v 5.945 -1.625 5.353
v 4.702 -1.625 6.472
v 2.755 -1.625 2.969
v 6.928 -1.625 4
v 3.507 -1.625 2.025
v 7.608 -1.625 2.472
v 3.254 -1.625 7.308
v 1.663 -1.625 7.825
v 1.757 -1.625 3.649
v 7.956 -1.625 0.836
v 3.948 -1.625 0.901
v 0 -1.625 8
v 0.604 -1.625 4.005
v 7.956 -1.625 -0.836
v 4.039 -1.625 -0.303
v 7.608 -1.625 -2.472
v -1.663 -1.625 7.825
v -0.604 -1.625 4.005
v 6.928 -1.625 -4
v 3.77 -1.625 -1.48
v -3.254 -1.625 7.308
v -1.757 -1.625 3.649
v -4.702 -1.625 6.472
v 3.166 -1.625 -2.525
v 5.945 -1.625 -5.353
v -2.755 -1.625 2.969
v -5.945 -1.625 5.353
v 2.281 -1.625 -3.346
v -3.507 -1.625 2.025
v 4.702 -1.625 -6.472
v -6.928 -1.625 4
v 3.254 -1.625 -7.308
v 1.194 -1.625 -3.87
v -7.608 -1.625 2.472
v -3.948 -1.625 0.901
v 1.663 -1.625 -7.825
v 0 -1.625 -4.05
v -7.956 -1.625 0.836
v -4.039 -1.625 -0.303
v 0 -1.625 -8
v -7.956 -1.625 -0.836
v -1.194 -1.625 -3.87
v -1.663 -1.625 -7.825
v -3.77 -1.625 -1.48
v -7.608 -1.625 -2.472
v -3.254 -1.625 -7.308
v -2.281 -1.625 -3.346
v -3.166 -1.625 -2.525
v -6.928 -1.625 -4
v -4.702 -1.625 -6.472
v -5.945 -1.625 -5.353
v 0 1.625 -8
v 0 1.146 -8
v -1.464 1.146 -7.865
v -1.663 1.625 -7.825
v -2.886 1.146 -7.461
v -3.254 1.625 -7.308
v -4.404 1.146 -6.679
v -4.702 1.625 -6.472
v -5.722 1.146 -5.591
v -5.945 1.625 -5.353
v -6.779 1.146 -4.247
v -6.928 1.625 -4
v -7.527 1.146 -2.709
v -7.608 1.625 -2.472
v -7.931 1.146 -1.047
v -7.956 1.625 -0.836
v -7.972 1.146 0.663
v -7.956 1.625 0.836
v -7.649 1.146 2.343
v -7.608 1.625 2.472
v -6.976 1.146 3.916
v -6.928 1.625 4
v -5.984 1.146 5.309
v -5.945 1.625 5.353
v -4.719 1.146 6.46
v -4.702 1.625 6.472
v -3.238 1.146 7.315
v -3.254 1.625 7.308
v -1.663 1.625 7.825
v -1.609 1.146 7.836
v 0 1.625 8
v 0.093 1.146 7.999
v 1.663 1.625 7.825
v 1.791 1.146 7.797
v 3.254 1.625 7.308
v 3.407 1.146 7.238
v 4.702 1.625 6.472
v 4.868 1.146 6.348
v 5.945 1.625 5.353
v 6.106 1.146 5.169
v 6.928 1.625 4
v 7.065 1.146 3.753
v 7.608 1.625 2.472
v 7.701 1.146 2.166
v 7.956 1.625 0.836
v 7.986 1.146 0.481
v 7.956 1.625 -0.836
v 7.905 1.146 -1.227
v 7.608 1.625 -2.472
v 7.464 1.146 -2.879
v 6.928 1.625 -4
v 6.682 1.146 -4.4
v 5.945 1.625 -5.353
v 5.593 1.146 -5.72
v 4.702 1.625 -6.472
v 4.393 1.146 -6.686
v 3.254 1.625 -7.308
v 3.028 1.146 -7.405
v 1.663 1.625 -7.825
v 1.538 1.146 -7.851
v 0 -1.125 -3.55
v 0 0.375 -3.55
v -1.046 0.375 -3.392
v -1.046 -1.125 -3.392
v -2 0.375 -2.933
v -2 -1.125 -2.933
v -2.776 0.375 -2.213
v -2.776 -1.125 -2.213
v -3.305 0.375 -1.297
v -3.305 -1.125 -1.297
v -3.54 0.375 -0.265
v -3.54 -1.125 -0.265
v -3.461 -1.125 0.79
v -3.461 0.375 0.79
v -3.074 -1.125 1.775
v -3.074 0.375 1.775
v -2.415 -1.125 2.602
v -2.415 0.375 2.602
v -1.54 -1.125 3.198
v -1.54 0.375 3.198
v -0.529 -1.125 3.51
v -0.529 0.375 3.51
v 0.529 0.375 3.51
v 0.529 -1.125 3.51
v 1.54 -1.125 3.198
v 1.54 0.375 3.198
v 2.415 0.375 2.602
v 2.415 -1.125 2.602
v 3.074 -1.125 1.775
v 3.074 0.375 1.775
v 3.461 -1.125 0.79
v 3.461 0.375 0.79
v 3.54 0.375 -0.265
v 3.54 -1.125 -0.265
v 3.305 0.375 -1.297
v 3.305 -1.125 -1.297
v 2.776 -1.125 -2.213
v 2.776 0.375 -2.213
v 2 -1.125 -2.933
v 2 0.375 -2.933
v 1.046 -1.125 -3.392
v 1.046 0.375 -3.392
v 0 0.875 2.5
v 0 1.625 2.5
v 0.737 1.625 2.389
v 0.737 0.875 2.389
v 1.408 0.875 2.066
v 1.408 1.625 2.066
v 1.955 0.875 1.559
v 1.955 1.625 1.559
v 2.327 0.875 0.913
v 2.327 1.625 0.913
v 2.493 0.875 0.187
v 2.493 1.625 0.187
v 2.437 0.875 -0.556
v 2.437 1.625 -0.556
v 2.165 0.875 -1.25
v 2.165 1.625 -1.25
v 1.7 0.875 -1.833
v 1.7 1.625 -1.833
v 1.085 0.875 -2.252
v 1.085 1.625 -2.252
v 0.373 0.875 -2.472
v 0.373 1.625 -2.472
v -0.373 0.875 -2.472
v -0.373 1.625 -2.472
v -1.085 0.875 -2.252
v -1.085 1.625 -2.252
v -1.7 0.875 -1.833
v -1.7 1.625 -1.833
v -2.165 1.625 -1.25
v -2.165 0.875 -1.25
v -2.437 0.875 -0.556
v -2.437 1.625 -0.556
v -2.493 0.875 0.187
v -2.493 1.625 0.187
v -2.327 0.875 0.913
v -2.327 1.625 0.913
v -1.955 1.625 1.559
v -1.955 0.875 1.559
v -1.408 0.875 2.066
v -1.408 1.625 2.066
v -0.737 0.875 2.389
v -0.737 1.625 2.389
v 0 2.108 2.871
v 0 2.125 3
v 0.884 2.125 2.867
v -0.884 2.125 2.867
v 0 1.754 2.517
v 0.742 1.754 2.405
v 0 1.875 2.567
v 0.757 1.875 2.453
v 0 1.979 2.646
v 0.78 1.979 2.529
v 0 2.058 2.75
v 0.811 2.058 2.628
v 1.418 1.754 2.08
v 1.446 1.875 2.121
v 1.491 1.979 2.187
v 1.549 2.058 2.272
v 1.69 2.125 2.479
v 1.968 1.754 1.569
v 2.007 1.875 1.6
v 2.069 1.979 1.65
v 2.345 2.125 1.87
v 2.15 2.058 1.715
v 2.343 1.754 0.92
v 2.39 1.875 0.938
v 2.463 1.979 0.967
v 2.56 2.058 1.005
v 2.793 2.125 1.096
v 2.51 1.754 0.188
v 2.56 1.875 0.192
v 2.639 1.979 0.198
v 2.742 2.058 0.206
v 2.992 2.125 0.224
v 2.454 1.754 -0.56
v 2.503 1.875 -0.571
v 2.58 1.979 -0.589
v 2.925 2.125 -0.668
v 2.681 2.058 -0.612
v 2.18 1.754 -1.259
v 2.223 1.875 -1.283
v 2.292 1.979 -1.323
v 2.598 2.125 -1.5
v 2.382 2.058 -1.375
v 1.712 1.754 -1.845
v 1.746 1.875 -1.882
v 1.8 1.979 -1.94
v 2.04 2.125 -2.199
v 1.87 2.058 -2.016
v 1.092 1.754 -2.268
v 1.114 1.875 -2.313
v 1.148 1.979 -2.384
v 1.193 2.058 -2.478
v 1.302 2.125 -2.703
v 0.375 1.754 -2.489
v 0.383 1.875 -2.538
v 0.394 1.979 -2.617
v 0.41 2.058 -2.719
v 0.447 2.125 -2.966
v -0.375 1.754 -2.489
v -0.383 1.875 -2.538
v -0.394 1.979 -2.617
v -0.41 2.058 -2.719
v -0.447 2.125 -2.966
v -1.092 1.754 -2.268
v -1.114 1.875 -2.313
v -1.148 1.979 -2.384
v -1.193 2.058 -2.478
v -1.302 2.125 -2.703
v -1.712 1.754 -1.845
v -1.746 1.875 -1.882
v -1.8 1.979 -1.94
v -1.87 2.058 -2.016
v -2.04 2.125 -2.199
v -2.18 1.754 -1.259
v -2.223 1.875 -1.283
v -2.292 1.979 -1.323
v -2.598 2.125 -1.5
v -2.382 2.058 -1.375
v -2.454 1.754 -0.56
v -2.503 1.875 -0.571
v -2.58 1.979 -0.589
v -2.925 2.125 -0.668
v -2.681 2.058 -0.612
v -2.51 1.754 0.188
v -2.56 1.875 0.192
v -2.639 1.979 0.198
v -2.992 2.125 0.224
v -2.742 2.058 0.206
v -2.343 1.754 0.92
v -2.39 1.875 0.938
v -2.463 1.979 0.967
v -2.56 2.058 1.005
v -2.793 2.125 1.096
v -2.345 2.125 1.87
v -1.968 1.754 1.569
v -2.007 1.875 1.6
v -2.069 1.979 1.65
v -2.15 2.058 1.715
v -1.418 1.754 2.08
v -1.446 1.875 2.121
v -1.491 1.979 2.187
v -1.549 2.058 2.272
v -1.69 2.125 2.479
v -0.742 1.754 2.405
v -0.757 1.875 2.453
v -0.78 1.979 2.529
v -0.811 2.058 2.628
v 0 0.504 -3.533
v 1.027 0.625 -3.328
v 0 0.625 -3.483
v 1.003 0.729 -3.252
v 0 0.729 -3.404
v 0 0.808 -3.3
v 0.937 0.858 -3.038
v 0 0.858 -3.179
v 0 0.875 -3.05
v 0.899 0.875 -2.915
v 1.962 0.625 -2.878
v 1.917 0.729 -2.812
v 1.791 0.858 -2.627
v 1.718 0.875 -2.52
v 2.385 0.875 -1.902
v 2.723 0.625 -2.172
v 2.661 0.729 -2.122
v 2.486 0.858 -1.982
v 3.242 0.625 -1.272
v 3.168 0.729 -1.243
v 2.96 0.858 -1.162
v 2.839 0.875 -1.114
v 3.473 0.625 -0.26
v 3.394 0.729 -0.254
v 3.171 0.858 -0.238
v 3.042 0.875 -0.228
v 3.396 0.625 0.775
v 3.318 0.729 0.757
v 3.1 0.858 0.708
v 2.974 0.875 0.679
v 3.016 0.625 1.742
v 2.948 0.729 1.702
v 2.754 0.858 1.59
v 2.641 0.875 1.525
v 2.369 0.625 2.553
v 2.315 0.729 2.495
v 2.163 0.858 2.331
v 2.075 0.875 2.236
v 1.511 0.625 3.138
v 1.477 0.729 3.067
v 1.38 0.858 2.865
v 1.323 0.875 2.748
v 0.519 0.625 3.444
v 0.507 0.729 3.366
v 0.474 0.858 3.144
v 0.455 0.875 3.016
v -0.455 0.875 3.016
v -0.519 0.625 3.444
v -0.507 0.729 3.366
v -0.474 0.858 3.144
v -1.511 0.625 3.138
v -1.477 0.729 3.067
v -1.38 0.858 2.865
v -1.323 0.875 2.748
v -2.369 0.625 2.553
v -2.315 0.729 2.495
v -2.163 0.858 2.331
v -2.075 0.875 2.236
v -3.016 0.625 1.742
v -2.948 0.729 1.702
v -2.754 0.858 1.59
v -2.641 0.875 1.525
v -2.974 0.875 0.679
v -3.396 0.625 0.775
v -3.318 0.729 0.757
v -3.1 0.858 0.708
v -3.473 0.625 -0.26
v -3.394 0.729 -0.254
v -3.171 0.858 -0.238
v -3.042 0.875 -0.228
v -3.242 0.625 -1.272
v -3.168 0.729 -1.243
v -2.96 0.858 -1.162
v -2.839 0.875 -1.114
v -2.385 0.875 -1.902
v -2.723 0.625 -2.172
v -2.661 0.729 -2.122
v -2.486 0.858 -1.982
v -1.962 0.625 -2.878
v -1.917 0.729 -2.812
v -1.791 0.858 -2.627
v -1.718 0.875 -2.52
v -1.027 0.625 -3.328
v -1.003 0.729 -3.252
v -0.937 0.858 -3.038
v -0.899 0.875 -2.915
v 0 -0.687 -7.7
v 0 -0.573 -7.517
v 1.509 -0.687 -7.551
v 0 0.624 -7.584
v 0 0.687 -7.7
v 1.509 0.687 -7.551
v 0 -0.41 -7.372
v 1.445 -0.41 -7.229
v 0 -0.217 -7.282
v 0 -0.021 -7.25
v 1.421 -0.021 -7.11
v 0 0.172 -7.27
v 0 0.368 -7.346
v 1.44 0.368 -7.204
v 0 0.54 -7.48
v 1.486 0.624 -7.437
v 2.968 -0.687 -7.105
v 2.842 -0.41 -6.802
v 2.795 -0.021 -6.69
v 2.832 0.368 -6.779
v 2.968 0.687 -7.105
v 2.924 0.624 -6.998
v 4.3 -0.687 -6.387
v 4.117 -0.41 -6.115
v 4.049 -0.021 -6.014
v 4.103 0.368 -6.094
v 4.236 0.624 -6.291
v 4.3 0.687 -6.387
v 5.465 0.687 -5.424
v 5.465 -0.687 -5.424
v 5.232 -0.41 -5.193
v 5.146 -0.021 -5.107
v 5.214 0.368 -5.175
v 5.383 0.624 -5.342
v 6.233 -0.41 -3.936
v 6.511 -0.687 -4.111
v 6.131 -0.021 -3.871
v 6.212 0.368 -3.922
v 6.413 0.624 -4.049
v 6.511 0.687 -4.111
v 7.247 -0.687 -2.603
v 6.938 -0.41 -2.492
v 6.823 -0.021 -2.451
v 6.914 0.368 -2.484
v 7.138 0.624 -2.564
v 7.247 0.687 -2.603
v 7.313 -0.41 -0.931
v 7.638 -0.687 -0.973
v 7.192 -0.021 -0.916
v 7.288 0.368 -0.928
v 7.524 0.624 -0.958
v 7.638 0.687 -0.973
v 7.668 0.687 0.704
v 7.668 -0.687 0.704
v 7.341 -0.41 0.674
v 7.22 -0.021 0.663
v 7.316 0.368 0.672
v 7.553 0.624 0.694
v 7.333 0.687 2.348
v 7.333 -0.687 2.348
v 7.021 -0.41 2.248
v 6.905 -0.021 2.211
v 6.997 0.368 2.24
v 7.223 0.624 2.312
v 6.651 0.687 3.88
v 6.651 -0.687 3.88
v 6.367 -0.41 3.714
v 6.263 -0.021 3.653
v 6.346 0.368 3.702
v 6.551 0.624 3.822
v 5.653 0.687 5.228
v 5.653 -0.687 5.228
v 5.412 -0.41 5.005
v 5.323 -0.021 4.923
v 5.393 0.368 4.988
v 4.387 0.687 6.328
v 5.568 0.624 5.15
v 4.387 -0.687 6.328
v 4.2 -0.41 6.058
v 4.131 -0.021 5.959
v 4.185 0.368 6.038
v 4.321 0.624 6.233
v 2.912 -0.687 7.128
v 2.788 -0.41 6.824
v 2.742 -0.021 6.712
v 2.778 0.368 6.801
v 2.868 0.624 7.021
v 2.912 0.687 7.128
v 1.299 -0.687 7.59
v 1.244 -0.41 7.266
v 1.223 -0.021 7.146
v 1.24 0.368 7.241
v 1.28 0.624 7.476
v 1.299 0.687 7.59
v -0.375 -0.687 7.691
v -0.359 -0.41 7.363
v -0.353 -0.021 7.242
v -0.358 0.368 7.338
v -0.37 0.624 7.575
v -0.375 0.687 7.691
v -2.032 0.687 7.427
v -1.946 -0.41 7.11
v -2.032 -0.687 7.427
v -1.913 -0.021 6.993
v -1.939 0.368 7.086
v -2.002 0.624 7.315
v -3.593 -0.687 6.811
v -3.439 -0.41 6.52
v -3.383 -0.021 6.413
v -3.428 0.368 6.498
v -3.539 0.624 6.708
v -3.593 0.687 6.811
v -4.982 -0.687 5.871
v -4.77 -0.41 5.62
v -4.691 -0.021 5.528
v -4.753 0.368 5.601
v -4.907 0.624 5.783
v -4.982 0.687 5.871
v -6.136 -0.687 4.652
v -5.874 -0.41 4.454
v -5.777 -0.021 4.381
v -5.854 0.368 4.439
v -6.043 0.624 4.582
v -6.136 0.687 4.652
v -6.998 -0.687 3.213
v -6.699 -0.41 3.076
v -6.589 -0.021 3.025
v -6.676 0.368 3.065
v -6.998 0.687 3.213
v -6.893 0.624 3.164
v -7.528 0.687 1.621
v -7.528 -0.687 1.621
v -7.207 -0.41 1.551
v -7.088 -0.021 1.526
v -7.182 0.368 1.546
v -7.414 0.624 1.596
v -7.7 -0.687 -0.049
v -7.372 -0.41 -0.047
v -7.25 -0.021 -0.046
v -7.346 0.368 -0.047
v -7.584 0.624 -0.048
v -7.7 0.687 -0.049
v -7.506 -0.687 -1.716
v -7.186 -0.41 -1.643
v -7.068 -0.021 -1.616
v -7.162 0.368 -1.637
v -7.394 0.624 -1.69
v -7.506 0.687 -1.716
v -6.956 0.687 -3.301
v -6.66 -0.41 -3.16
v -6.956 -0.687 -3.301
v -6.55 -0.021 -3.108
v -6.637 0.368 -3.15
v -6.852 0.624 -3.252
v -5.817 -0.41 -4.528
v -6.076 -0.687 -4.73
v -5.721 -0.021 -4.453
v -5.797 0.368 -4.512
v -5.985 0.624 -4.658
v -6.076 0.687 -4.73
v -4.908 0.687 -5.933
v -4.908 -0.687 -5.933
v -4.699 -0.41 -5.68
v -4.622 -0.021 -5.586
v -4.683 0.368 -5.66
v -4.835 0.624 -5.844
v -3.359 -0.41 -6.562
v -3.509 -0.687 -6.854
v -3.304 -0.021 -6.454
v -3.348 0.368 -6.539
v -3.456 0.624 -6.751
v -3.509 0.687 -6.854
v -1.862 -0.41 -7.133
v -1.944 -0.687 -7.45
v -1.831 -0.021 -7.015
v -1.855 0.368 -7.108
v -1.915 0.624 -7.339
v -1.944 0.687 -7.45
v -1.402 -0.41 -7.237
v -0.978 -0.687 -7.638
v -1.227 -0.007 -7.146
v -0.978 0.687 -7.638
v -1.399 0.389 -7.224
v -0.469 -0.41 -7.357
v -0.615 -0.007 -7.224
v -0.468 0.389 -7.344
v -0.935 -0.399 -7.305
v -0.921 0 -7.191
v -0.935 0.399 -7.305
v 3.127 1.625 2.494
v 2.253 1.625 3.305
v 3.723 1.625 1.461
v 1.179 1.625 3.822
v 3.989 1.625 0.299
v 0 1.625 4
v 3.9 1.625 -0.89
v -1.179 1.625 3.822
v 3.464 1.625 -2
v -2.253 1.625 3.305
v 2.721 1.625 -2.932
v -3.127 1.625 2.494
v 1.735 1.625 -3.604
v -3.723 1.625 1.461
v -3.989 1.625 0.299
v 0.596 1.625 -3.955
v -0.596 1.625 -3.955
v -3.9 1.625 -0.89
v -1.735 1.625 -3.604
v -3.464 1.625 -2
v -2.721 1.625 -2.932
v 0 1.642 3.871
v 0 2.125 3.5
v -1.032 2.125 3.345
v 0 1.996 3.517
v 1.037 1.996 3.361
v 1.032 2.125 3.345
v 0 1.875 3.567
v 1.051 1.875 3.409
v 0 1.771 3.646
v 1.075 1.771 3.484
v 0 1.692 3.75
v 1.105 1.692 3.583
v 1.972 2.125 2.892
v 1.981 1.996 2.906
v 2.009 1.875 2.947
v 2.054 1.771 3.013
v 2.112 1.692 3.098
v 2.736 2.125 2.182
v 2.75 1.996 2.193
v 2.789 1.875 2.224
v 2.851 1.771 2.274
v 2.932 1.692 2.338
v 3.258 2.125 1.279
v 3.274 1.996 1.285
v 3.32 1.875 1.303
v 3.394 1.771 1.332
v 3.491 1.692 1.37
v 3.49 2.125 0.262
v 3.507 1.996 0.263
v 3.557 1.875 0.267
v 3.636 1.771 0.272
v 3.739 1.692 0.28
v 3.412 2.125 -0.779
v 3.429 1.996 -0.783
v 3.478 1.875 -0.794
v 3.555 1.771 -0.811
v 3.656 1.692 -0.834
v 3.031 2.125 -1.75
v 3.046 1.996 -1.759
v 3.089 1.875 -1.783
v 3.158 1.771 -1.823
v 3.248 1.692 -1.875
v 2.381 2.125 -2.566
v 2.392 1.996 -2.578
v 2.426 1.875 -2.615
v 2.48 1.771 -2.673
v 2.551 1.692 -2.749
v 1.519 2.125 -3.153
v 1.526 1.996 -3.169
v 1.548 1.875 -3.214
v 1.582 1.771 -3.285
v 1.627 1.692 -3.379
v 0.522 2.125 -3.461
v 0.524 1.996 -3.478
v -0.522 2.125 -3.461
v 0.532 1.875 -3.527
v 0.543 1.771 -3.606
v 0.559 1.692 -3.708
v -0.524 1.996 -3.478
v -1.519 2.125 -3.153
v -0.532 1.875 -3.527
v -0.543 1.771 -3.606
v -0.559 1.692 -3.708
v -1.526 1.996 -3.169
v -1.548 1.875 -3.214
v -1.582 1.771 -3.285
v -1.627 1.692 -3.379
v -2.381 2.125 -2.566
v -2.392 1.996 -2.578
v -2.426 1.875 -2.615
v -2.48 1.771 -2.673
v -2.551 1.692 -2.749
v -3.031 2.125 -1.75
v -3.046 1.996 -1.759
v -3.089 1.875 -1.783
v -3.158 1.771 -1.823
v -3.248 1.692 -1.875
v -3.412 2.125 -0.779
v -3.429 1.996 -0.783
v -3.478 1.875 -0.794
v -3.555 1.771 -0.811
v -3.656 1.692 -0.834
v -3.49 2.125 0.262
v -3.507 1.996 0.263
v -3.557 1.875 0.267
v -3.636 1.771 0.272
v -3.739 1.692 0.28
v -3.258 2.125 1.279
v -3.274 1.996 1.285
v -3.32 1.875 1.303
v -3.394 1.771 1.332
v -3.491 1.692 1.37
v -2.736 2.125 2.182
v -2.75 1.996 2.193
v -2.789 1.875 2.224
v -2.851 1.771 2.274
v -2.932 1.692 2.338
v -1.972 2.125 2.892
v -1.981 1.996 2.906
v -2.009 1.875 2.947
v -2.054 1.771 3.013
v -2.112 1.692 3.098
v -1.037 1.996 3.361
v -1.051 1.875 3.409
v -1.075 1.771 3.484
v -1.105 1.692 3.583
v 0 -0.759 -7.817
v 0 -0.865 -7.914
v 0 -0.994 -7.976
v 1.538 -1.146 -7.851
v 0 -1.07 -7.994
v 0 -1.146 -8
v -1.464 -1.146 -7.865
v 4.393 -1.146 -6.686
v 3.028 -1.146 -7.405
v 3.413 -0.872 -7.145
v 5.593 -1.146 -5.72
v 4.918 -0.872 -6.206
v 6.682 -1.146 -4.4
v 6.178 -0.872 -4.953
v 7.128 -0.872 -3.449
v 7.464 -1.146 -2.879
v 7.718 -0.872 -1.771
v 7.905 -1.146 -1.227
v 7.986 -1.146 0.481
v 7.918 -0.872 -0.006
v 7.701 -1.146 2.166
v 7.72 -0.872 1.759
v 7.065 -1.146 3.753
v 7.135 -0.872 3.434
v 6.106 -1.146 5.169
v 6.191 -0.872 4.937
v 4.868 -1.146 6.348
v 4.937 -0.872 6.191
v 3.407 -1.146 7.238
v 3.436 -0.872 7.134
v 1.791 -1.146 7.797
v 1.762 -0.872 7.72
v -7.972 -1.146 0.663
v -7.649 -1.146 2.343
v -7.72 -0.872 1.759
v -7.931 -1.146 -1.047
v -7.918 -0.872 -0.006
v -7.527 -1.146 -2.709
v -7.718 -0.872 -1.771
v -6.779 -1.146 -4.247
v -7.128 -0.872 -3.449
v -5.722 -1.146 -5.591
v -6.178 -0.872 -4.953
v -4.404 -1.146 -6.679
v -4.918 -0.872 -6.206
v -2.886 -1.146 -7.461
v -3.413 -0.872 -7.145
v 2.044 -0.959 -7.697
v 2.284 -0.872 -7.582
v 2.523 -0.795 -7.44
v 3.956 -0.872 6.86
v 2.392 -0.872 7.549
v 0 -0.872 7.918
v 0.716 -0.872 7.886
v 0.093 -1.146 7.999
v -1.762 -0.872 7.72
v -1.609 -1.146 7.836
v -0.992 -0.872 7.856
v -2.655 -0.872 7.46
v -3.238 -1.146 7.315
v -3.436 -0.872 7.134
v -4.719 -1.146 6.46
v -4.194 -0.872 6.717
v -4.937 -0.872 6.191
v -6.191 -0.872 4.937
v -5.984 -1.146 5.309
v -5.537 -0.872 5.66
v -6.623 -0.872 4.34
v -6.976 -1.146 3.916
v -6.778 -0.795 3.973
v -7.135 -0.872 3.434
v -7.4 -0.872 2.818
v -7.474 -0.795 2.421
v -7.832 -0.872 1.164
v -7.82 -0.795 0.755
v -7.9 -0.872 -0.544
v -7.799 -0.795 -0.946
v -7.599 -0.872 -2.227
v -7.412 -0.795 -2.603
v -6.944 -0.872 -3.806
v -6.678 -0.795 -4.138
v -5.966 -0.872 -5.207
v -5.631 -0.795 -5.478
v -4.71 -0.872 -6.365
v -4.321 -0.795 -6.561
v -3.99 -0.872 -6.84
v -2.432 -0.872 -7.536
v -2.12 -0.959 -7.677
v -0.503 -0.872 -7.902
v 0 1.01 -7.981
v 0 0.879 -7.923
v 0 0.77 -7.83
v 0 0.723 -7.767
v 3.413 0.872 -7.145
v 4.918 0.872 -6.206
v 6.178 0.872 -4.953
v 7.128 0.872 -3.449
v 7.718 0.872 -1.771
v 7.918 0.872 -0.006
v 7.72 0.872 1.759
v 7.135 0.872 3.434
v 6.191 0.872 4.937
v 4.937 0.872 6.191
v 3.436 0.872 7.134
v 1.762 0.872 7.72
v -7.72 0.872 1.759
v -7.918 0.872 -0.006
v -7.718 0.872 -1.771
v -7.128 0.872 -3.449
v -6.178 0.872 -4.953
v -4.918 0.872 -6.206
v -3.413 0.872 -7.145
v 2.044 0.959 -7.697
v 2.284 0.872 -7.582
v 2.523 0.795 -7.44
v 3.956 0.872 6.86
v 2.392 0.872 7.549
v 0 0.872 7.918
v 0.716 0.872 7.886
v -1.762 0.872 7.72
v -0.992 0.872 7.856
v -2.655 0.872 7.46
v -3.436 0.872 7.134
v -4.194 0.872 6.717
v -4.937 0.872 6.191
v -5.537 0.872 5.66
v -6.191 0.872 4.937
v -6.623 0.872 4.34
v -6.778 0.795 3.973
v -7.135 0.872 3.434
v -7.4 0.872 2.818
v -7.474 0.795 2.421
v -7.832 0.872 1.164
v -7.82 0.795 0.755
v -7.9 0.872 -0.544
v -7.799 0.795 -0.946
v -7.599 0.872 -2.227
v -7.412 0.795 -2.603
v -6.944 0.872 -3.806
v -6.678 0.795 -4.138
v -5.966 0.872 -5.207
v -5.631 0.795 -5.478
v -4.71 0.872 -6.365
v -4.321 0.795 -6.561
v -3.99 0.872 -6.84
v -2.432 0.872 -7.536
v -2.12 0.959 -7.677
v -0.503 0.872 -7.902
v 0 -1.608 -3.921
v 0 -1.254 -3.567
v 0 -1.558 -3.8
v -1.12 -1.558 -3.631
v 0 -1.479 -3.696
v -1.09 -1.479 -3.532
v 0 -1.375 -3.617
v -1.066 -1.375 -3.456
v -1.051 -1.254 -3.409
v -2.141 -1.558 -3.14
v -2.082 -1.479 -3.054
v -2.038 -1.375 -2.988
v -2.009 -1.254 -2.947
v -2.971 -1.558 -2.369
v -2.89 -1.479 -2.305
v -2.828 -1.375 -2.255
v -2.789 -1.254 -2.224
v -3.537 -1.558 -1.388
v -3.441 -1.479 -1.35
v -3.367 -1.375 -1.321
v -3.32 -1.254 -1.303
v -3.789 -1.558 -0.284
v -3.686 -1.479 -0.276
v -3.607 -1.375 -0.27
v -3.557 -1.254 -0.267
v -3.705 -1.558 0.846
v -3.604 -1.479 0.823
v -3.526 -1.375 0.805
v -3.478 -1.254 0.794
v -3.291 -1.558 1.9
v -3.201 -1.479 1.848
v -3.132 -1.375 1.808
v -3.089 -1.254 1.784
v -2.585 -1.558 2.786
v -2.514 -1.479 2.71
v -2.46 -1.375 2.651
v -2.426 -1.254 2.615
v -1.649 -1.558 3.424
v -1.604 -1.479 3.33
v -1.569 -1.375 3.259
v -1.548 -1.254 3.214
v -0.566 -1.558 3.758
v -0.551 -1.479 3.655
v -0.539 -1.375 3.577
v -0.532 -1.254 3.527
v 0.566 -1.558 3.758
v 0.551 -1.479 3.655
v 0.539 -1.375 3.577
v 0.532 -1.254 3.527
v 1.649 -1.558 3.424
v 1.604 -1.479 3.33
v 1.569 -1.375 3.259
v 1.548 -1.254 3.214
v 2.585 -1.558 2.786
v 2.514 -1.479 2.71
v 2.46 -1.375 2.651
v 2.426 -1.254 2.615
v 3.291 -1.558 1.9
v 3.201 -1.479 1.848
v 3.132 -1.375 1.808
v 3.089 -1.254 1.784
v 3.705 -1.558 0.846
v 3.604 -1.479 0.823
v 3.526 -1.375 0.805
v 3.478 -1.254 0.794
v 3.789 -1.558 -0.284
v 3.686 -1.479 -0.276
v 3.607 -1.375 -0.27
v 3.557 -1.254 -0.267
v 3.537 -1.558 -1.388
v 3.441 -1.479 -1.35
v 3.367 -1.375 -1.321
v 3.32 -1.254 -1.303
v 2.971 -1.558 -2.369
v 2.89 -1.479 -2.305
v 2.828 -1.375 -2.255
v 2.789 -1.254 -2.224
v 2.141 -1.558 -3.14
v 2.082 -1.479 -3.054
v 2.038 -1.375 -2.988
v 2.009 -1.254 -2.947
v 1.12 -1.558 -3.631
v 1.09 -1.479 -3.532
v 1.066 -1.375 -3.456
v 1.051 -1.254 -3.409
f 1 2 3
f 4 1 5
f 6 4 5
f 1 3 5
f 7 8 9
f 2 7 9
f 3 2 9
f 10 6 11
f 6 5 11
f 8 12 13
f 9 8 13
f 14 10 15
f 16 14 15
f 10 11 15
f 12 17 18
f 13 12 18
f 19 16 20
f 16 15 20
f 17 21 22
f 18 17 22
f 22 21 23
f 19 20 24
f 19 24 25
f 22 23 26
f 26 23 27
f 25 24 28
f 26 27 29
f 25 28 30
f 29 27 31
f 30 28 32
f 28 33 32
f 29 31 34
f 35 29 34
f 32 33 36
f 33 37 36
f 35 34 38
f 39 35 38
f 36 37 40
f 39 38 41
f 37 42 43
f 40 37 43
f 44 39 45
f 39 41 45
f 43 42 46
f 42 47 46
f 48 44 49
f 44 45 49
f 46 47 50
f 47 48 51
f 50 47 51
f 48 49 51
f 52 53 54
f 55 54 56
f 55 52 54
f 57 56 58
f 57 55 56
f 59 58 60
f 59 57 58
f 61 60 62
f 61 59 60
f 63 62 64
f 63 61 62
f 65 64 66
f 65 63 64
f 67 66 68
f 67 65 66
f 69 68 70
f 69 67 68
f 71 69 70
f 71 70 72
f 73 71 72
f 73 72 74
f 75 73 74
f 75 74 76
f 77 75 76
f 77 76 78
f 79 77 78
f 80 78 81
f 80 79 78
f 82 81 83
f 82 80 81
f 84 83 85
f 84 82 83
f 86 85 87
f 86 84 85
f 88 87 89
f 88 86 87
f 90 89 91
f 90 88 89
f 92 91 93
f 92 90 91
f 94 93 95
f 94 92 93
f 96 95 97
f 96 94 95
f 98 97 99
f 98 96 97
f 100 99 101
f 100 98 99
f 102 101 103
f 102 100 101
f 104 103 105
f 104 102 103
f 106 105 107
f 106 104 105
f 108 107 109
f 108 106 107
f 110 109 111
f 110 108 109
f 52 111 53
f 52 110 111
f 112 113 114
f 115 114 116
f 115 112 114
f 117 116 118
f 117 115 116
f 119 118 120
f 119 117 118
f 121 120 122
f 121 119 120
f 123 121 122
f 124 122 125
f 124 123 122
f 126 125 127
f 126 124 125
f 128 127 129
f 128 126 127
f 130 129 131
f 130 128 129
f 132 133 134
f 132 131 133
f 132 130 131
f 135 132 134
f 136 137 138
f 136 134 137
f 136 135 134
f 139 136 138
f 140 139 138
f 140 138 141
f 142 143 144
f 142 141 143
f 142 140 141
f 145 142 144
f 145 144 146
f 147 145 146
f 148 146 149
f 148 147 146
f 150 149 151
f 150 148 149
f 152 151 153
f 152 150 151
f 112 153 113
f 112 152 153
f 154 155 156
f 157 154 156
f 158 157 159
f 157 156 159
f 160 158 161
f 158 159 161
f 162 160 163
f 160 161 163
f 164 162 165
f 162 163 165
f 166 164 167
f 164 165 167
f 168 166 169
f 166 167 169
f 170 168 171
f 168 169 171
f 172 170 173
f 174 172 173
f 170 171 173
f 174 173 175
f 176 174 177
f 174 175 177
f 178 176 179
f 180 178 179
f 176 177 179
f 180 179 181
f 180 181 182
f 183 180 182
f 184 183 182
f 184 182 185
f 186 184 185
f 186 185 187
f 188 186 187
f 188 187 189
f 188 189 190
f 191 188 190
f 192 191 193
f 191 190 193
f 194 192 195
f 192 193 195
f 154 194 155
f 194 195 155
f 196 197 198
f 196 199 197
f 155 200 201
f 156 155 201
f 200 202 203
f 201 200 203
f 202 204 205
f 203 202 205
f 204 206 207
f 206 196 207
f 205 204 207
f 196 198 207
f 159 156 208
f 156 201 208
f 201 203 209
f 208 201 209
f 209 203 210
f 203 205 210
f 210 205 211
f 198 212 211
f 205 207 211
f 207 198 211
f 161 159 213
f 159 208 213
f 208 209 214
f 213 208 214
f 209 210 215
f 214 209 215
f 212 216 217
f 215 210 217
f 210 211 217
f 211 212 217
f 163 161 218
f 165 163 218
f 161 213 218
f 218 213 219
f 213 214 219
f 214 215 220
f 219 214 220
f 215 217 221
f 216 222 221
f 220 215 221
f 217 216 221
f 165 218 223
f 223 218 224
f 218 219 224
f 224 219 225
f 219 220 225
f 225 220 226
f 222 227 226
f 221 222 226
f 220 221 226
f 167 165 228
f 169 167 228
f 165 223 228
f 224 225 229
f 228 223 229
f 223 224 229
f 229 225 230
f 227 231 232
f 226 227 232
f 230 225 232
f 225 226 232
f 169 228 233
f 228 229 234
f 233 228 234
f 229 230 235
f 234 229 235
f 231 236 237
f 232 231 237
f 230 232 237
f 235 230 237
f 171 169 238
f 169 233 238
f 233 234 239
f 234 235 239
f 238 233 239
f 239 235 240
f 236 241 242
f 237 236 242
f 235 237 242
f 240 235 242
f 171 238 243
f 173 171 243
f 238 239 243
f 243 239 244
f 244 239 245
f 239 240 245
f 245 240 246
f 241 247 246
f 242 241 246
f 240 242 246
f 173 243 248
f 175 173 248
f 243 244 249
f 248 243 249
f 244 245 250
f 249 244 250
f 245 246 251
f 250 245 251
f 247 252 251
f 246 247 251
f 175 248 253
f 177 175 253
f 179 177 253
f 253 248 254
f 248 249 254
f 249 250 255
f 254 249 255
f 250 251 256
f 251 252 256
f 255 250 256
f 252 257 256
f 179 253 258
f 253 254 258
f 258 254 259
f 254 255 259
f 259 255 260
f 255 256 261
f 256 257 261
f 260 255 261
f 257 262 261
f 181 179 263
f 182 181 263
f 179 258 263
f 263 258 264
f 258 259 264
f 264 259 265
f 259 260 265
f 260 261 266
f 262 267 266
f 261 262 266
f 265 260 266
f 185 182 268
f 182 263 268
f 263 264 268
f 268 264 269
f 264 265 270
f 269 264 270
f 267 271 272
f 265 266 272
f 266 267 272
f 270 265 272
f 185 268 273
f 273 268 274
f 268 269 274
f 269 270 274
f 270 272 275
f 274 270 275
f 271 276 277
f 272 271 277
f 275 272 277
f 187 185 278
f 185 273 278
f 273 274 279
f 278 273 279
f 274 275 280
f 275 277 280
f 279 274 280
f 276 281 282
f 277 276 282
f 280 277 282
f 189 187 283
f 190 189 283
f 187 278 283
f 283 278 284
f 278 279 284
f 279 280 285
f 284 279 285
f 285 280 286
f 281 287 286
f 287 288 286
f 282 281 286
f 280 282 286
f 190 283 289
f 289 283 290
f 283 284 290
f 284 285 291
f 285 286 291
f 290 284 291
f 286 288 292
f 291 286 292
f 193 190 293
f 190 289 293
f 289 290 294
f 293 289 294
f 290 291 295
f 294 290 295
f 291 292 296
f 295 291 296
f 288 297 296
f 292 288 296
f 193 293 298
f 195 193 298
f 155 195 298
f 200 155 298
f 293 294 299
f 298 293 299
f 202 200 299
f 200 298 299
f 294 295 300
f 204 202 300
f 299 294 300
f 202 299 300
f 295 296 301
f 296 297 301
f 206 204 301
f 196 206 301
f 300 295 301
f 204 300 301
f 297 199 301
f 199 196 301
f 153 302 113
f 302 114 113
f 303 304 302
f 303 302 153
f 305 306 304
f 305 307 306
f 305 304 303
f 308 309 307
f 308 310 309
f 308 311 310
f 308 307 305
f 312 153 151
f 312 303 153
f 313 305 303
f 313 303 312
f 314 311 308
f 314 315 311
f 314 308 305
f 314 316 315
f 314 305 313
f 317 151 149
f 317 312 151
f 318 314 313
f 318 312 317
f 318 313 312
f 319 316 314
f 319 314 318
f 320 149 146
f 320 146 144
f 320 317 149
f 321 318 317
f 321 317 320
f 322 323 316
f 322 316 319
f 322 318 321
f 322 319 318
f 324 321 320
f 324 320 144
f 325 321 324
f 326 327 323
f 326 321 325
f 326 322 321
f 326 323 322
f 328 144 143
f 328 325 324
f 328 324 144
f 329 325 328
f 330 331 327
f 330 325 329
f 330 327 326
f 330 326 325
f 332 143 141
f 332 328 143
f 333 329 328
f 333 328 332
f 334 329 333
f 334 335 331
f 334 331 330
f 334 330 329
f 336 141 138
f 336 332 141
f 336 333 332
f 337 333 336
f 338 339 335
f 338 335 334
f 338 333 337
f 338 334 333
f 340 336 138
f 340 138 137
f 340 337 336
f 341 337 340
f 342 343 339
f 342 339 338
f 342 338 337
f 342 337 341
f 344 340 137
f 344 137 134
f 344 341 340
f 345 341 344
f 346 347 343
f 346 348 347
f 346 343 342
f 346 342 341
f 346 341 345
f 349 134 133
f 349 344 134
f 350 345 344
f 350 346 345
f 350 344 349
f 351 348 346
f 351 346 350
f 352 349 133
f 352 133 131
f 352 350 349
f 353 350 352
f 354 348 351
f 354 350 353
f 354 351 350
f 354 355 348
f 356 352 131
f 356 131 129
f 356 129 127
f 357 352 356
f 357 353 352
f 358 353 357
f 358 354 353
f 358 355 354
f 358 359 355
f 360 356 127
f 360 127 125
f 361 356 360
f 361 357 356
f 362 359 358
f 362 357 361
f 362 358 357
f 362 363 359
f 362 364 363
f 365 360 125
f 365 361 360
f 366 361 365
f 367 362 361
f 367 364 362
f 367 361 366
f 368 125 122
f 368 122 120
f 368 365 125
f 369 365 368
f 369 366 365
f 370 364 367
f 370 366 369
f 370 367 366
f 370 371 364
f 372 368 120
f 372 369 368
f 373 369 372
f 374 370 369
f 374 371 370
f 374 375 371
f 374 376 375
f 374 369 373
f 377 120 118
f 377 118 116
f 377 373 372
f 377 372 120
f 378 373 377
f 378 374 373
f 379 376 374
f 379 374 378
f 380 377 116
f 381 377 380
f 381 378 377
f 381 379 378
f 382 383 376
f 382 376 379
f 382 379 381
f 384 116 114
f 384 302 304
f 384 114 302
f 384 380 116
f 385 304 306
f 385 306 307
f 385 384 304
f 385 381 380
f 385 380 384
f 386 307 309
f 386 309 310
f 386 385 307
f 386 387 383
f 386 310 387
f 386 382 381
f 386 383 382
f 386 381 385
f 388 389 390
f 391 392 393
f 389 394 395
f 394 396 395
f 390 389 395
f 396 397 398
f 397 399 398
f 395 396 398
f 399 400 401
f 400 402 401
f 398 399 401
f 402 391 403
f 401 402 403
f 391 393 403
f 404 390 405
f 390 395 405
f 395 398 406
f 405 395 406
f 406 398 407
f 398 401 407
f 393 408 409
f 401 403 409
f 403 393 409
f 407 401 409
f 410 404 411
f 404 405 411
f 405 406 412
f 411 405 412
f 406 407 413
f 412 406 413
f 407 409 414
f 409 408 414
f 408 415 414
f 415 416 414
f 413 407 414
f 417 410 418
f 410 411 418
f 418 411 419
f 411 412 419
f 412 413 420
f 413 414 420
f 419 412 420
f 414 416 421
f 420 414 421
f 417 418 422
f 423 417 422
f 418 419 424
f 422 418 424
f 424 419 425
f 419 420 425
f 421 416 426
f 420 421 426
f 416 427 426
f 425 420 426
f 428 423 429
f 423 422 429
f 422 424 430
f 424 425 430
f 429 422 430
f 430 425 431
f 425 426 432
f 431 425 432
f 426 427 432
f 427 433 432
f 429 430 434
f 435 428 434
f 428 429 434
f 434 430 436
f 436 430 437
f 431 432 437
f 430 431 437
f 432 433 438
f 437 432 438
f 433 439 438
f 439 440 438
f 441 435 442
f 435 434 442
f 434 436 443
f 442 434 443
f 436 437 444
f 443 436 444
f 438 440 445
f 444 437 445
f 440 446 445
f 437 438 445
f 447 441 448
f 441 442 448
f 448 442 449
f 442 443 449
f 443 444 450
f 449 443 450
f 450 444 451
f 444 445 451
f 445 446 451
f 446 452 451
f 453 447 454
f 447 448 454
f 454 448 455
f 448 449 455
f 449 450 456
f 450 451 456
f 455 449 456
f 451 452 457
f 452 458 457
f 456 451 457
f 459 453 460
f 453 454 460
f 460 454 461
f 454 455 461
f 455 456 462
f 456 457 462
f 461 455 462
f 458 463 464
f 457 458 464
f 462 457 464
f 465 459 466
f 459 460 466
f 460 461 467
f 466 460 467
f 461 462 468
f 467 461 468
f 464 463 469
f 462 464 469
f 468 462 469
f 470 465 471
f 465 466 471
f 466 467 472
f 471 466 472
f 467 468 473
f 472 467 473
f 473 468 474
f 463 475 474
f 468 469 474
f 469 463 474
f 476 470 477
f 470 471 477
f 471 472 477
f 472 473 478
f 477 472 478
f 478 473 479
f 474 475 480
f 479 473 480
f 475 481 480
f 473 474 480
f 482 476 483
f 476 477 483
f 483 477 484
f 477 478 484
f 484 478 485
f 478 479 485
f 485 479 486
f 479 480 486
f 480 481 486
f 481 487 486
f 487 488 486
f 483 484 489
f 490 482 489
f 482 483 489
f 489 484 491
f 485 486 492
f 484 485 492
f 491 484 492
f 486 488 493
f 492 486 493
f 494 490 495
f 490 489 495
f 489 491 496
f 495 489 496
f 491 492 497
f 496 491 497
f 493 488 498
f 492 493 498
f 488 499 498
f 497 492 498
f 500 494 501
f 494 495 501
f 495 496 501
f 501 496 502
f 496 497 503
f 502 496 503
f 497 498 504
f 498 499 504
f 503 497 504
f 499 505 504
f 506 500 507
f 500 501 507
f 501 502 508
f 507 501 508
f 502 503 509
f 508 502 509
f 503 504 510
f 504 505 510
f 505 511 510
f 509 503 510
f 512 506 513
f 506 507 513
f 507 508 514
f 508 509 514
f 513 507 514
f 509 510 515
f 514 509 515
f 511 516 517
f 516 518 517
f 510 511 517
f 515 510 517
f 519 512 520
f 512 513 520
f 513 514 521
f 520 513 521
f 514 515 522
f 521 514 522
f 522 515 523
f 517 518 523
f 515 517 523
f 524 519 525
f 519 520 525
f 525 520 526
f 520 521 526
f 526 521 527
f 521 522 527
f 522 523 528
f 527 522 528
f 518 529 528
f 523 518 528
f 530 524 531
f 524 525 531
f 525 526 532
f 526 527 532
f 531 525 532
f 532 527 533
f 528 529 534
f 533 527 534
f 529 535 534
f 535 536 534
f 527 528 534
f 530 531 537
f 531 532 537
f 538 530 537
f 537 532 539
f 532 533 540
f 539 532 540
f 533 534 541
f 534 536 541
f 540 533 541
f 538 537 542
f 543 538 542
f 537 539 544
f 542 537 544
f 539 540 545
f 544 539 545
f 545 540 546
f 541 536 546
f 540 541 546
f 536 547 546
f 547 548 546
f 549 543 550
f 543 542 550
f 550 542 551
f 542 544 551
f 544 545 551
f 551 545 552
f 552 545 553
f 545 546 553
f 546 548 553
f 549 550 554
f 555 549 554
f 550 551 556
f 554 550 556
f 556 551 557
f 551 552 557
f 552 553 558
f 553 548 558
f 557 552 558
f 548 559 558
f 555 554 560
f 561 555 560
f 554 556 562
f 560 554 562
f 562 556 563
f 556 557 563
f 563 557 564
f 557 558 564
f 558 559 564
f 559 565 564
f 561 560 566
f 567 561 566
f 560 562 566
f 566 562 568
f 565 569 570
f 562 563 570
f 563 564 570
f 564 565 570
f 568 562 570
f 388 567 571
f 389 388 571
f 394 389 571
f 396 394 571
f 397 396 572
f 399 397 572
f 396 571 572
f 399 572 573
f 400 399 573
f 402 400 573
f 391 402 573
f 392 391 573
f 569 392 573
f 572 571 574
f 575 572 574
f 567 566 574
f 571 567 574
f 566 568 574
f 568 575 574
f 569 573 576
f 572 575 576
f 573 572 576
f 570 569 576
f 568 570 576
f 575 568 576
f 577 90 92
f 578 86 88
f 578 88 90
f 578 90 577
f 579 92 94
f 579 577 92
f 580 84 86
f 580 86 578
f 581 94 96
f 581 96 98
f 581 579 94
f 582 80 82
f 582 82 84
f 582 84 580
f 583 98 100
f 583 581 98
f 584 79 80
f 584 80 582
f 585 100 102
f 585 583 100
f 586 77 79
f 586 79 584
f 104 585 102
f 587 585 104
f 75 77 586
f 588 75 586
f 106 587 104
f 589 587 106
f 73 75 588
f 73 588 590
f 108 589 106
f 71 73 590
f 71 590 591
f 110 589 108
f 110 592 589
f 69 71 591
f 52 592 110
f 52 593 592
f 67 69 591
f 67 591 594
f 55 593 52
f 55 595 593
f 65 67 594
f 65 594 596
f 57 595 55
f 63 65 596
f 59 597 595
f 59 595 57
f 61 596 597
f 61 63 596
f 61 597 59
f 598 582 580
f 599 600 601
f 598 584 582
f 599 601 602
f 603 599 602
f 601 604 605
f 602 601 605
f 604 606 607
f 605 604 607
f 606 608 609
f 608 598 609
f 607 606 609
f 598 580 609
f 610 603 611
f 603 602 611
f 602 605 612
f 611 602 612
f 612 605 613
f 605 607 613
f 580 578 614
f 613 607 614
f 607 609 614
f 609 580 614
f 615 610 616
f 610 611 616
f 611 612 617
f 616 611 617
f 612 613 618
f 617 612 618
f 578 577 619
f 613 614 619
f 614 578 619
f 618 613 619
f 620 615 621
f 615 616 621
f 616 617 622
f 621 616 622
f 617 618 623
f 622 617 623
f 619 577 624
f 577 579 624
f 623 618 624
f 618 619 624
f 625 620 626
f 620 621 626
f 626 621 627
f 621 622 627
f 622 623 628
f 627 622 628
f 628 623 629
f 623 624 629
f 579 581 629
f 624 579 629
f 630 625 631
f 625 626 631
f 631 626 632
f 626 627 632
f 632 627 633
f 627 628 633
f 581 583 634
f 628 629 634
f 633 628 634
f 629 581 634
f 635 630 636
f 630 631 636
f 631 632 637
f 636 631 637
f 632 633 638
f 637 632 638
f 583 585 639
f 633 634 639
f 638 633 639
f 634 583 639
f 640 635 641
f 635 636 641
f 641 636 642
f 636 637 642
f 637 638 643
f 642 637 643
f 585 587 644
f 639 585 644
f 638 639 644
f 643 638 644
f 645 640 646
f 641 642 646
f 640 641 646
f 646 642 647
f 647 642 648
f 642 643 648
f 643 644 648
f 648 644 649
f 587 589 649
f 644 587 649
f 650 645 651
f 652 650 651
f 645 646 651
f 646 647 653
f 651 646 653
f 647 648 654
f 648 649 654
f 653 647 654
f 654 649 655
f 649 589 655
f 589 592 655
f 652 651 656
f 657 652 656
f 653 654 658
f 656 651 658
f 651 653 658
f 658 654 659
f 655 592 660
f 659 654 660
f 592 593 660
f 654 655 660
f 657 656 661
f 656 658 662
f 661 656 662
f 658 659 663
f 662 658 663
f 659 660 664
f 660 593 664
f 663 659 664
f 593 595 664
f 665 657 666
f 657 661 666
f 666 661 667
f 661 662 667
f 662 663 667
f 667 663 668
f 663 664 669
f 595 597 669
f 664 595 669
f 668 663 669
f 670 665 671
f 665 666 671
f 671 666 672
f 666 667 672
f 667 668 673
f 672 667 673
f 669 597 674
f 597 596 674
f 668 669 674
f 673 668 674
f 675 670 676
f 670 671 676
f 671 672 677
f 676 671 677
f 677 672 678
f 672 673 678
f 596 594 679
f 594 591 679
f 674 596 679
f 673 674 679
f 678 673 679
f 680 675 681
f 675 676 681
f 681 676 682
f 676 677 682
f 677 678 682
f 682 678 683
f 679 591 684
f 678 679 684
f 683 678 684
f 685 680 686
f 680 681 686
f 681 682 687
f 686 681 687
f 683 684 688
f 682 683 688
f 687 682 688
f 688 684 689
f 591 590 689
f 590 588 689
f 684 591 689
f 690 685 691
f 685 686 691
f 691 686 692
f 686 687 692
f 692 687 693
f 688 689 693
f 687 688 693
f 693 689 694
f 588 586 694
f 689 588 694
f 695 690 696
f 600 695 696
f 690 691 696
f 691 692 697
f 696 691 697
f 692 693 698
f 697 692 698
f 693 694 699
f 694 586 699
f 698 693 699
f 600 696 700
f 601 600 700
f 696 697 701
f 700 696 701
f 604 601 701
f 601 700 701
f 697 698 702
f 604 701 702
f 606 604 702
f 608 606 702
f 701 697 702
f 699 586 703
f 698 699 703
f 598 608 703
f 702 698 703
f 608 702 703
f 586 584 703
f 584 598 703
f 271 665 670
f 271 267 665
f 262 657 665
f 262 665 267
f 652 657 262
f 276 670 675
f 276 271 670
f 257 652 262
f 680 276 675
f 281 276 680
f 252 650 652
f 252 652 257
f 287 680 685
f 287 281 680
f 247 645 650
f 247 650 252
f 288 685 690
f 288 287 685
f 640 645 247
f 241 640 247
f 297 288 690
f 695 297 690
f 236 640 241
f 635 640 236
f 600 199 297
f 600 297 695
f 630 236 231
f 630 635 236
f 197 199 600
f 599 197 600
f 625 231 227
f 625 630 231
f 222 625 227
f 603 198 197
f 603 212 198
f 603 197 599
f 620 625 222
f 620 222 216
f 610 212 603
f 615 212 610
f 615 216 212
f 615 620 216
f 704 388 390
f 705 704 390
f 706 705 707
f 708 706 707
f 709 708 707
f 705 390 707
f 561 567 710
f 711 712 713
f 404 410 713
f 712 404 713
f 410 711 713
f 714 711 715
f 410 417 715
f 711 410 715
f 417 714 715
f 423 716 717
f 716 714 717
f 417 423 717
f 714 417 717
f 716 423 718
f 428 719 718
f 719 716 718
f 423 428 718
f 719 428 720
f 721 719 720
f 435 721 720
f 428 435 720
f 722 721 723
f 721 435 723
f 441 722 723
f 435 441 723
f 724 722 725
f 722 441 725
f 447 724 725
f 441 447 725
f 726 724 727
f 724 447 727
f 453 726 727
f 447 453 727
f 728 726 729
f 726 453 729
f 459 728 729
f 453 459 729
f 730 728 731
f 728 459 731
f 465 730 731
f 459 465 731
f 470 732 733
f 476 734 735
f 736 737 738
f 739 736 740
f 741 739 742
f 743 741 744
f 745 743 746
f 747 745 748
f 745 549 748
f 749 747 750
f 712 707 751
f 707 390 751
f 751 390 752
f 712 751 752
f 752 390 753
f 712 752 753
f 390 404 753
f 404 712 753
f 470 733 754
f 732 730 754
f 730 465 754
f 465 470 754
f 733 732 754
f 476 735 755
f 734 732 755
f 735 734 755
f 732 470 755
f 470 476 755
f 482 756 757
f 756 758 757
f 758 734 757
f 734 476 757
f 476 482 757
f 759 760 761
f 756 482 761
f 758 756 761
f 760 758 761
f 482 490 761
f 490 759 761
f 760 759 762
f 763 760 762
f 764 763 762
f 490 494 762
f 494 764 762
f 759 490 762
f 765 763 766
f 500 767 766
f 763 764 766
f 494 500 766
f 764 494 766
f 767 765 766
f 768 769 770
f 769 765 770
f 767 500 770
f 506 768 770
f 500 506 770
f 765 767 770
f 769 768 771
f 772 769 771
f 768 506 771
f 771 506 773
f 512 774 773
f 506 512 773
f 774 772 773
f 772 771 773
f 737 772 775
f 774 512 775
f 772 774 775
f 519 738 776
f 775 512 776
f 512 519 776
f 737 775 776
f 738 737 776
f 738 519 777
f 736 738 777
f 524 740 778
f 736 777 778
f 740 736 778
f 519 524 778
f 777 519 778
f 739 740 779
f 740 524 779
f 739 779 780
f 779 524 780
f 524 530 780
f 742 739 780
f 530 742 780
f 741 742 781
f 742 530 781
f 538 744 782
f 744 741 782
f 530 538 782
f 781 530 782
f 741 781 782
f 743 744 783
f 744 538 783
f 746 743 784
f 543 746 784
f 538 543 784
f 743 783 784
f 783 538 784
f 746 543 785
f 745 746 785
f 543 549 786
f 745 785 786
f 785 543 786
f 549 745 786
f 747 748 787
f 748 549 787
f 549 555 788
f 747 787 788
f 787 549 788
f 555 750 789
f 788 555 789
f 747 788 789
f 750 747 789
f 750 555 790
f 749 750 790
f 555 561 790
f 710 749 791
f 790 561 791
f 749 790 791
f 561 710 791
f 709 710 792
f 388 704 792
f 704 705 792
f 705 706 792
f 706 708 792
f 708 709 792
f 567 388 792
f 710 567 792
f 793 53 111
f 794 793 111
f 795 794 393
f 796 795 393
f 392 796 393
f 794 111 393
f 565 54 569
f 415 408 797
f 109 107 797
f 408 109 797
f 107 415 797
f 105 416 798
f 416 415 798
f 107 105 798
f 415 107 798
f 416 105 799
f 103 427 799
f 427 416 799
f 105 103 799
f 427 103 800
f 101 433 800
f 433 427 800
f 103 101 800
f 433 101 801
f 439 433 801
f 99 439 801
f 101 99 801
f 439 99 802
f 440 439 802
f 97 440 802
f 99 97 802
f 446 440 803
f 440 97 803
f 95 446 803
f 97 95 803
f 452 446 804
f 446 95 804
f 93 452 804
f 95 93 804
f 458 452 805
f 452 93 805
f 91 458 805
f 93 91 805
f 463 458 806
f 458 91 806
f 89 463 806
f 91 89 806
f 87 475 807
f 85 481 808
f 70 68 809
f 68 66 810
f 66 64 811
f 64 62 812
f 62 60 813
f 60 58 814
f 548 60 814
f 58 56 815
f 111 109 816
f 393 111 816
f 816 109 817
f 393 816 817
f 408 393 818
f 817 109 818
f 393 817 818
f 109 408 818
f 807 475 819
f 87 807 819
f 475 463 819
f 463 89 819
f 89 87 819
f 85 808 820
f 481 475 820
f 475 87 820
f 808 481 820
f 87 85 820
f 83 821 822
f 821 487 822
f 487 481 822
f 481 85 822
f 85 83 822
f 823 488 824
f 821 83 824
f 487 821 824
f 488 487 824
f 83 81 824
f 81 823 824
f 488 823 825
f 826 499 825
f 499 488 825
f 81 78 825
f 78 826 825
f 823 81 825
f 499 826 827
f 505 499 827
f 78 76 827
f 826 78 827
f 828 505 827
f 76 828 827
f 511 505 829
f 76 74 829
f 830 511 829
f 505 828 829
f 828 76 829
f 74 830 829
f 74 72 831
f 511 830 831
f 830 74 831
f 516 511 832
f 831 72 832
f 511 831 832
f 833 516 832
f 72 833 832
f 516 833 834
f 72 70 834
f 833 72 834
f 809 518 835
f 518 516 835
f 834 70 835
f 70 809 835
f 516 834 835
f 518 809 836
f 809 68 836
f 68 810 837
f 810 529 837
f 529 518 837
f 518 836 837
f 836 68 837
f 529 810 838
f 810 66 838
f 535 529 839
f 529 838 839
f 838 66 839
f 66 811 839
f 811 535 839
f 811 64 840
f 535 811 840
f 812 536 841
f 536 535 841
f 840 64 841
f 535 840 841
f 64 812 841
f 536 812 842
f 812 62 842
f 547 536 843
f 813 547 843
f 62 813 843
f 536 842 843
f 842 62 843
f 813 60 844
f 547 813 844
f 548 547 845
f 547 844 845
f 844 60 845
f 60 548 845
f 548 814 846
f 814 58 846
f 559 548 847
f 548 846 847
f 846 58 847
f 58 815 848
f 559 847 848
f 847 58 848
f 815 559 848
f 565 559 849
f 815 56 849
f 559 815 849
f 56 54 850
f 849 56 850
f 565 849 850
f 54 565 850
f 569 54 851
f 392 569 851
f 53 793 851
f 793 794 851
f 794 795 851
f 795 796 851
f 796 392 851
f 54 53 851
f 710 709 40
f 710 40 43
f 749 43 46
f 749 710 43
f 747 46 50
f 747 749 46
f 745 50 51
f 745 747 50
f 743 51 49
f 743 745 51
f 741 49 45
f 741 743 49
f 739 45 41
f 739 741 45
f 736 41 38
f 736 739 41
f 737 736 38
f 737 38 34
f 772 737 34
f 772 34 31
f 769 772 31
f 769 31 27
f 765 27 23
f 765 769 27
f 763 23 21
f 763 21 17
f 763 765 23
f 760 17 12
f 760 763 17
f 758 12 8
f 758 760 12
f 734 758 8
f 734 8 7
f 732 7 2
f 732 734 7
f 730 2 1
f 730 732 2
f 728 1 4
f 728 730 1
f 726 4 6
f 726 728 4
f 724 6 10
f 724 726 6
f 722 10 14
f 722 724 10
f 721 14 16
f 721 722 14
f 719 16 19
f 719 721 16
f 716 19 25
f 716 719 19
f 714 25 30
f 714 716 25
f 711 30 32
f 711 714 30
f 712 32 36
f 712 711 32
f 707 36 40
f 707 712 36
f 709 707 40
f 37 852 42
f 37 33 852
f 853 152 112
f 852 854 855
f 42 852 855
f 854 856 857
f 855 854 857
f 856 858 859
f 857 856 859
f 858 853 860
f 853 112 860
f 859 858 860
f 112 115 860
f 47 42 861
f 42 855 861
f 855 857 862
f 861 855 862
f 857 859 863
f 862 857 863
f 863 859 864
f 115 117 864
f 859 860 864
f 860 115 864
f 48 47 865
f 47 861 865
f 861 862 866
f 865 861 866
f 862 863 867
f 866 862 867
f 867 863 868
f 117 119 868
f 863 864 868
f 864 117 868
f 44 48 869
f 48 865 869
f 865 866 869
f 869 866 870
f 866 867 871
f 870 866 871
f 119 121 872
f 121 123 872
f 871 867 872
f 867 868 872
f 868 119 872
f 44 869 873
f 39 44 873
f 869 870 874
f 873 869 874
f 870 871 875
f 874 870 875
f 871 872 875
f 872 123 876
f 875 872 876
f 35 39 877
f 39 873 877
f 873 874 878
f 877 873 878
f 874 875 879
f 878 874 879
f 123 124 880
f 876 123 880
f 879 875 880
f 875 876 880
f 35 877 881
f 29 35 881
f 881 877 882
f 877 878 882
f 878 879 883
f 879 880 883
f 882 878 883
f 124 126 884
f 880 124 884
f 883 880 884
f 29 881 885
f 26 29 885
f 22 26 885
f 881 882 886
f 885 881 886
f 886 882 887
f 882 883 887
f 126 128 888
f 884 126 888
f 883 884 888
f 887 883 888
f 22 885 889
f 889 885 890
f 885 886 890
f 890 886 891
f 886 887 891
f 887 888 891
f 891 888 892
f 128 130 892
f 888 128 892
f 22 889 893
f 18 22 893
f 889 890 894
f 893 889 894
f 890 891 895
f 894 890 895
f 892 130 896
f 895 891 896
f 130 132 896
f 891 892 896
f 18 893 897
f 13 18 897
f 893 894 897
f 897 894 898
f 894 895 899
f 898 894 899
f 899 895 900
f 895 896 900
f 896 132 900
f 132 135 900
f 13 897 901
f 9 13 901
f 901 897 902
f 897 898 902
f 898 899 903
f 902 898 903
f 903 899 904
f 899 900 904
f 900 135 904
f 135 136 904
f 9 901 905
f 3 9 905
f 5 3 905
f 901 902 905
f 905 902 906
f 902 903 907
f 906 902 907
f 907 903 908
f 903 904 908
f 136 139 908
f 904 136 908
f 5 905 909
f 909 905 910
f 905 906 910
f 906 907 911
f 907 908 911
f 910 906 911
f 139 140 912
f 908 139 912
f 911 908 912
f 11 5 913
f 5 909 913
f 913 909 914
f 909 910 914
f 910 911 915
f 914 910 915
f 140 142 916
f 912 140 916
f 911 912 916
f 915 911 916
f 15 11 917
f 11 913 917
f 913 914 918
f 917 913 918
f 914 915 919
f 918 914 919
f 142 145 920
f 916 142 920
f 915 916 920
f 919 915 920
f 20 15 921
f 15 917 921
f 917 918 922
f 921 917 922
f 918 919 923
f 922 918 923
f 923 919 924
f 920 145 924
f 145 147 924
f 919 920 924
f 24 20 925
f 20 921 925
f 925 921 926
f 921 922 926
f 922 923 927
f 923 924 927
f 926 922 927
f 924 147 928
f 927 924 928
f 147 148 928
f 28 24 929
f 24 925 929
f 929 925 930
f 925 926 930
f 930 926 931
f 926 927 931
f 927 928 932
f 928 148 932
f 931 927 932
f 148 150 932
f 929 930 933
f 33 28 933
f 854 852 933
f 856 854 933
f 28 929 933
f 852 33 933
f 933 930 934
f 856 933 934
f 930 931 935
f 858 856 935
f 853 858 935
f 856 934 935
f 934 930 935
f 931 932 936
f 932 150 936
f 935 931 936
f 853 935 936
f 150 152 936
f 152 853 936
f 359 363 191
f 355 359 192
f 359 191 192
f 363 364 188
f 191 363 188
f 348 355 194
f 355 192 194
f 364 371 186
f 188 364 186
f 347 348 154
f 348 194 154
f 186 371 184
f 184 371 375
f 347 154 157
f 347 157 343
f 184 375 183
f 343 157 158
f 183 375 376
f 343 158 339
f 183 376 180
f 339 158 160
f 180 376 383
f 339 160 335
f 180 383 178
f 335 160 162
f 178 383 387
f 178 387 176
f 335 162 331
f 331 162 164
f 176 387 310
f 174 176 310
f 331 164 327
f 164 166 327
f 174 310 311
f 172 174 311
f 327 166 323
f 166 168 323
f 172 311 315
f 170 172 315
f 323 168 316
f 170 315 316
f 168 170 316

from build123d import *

# Parameters (mm, degrees)
SKETCH1_R           = 8
SKETCH1_R_2         = 3.55
BOSS_EXTRUDE1_DEPTH = 1.625
SKETCH3_R           = 4
SKETCH3_R_2         = 2.5
BOSS_EXTRUDE2_DEPTH = 0.75
BOSS_EXTRUDE3_START = 0.5
SKETCH4_R           = 3.5
SKETCH4_R_2         = 2.5
BOSS_EXTRUDE3_DEPTH = 0.5
FILLET2_R           = 0.5


with BuildPart() as part:
    # Sketch1 → Boss-Extrude1 (new, symmetric)
    with BuildSketch(Plane(origin=(0, 0, 0), x_dir=(1, 0, 0), z_dir=(0, 1, 0))):
        with Locations(Location((0, 0, 0), (0, 0, 90))):
            Circle(SKETCH1_R)
        with Locations(Location((0, 0, 0), (0, 0, 90))):
            Circle(SKETCH1_R_2, mode=Mode.SUBTRACT)
    extrude(amount=BOSS_EXTRUDE1_DEPTH, both=True)

    # Sketch2 → Cut-Revolve1 (revolve, cut)
    with BuildSketch(Plane(origin=(0, 0, 0), x_dir=(0, 0, -1), z_dir=(1, 0, 0)), mode=Mode.PRIVATE) as cut_revolve1_sk:
        with BuildLine():
            Line((-8, 0.75), (-8, -0.75))
            add(Edge.make_bspline(
                [(-8, -0.75), (-7.25, -0.75), (-7.25, 0), (-7.25, 0.75), (-8, 0.75)],
                knots=[4.71238898, 4.71238898, 4.71238898, 6.283185307, 6.283185307, 7.853981634, 7.853981634, 7.853981634], degree=2, weights=[1, 0.707106781, 1, 0.707106781, 1]))
        make_face()
    revolve(cut_revolve1_sk.sketch.rotate(Axis((0, 1.625, 0), (0, -1, 0)), 180), axis=Axis((0, 1.625, 0), (0, -1, 0)), mode=Mode.SUBTRACT)

    # Sketch3 → Boss-Extrude2 (add)
    with BuildSketch(Plane(origin=(0, 1.625, 0), x_dir=(1, 0, 0), z_dir=(0, 1, 0))):
        Circle(SKETCH3_R)
        with Locations(Location((0, 0, 0), (0, 0, 270))):
            Circle(SKETCH3_R_2, mode=Mode.SUBTRACT)
    extrude(amount=-BOSS_EXTRUDE2_DEPTH)

    # Sketch4 → Boss-Extrude3 (add)
    with BuildSketch(Plane(origin=(0, 1.625, 0), x_dir=(1, 0, 0), z_dir=(0, 1, 0)).offset(BOSS_EXTRUDE3_START)):
        with Locations(Location((0, 0, 0), (0, 0, 270))):
            Circle(SKETCH4_R)
        with Locations(Location((0, 0, 0), (0, 0, 270))):
            Circle(SKETCH4_R_2, mode=Mode.SUBTRACT)
    extrude(amount=-BOSS_EXTRUDE3_DEPTH)

    # Fillet2
    fillet2_edges = [part.edges().sort_by_distance(p)[0] for p in [
        (0, 0.75, 8),
        (0, -0.75, 8),
        (0, 0.875, 3.55),
        (0, 1.625, -3.5),
        (0, 2.125, -2.5),
        (0, -1.625, 3.55),
    ]]
    fillet(fillet2_edges, radius=FILLET2_R - 0.0001)  # a hair under: the kernel refuses the full size


solid = part.part
